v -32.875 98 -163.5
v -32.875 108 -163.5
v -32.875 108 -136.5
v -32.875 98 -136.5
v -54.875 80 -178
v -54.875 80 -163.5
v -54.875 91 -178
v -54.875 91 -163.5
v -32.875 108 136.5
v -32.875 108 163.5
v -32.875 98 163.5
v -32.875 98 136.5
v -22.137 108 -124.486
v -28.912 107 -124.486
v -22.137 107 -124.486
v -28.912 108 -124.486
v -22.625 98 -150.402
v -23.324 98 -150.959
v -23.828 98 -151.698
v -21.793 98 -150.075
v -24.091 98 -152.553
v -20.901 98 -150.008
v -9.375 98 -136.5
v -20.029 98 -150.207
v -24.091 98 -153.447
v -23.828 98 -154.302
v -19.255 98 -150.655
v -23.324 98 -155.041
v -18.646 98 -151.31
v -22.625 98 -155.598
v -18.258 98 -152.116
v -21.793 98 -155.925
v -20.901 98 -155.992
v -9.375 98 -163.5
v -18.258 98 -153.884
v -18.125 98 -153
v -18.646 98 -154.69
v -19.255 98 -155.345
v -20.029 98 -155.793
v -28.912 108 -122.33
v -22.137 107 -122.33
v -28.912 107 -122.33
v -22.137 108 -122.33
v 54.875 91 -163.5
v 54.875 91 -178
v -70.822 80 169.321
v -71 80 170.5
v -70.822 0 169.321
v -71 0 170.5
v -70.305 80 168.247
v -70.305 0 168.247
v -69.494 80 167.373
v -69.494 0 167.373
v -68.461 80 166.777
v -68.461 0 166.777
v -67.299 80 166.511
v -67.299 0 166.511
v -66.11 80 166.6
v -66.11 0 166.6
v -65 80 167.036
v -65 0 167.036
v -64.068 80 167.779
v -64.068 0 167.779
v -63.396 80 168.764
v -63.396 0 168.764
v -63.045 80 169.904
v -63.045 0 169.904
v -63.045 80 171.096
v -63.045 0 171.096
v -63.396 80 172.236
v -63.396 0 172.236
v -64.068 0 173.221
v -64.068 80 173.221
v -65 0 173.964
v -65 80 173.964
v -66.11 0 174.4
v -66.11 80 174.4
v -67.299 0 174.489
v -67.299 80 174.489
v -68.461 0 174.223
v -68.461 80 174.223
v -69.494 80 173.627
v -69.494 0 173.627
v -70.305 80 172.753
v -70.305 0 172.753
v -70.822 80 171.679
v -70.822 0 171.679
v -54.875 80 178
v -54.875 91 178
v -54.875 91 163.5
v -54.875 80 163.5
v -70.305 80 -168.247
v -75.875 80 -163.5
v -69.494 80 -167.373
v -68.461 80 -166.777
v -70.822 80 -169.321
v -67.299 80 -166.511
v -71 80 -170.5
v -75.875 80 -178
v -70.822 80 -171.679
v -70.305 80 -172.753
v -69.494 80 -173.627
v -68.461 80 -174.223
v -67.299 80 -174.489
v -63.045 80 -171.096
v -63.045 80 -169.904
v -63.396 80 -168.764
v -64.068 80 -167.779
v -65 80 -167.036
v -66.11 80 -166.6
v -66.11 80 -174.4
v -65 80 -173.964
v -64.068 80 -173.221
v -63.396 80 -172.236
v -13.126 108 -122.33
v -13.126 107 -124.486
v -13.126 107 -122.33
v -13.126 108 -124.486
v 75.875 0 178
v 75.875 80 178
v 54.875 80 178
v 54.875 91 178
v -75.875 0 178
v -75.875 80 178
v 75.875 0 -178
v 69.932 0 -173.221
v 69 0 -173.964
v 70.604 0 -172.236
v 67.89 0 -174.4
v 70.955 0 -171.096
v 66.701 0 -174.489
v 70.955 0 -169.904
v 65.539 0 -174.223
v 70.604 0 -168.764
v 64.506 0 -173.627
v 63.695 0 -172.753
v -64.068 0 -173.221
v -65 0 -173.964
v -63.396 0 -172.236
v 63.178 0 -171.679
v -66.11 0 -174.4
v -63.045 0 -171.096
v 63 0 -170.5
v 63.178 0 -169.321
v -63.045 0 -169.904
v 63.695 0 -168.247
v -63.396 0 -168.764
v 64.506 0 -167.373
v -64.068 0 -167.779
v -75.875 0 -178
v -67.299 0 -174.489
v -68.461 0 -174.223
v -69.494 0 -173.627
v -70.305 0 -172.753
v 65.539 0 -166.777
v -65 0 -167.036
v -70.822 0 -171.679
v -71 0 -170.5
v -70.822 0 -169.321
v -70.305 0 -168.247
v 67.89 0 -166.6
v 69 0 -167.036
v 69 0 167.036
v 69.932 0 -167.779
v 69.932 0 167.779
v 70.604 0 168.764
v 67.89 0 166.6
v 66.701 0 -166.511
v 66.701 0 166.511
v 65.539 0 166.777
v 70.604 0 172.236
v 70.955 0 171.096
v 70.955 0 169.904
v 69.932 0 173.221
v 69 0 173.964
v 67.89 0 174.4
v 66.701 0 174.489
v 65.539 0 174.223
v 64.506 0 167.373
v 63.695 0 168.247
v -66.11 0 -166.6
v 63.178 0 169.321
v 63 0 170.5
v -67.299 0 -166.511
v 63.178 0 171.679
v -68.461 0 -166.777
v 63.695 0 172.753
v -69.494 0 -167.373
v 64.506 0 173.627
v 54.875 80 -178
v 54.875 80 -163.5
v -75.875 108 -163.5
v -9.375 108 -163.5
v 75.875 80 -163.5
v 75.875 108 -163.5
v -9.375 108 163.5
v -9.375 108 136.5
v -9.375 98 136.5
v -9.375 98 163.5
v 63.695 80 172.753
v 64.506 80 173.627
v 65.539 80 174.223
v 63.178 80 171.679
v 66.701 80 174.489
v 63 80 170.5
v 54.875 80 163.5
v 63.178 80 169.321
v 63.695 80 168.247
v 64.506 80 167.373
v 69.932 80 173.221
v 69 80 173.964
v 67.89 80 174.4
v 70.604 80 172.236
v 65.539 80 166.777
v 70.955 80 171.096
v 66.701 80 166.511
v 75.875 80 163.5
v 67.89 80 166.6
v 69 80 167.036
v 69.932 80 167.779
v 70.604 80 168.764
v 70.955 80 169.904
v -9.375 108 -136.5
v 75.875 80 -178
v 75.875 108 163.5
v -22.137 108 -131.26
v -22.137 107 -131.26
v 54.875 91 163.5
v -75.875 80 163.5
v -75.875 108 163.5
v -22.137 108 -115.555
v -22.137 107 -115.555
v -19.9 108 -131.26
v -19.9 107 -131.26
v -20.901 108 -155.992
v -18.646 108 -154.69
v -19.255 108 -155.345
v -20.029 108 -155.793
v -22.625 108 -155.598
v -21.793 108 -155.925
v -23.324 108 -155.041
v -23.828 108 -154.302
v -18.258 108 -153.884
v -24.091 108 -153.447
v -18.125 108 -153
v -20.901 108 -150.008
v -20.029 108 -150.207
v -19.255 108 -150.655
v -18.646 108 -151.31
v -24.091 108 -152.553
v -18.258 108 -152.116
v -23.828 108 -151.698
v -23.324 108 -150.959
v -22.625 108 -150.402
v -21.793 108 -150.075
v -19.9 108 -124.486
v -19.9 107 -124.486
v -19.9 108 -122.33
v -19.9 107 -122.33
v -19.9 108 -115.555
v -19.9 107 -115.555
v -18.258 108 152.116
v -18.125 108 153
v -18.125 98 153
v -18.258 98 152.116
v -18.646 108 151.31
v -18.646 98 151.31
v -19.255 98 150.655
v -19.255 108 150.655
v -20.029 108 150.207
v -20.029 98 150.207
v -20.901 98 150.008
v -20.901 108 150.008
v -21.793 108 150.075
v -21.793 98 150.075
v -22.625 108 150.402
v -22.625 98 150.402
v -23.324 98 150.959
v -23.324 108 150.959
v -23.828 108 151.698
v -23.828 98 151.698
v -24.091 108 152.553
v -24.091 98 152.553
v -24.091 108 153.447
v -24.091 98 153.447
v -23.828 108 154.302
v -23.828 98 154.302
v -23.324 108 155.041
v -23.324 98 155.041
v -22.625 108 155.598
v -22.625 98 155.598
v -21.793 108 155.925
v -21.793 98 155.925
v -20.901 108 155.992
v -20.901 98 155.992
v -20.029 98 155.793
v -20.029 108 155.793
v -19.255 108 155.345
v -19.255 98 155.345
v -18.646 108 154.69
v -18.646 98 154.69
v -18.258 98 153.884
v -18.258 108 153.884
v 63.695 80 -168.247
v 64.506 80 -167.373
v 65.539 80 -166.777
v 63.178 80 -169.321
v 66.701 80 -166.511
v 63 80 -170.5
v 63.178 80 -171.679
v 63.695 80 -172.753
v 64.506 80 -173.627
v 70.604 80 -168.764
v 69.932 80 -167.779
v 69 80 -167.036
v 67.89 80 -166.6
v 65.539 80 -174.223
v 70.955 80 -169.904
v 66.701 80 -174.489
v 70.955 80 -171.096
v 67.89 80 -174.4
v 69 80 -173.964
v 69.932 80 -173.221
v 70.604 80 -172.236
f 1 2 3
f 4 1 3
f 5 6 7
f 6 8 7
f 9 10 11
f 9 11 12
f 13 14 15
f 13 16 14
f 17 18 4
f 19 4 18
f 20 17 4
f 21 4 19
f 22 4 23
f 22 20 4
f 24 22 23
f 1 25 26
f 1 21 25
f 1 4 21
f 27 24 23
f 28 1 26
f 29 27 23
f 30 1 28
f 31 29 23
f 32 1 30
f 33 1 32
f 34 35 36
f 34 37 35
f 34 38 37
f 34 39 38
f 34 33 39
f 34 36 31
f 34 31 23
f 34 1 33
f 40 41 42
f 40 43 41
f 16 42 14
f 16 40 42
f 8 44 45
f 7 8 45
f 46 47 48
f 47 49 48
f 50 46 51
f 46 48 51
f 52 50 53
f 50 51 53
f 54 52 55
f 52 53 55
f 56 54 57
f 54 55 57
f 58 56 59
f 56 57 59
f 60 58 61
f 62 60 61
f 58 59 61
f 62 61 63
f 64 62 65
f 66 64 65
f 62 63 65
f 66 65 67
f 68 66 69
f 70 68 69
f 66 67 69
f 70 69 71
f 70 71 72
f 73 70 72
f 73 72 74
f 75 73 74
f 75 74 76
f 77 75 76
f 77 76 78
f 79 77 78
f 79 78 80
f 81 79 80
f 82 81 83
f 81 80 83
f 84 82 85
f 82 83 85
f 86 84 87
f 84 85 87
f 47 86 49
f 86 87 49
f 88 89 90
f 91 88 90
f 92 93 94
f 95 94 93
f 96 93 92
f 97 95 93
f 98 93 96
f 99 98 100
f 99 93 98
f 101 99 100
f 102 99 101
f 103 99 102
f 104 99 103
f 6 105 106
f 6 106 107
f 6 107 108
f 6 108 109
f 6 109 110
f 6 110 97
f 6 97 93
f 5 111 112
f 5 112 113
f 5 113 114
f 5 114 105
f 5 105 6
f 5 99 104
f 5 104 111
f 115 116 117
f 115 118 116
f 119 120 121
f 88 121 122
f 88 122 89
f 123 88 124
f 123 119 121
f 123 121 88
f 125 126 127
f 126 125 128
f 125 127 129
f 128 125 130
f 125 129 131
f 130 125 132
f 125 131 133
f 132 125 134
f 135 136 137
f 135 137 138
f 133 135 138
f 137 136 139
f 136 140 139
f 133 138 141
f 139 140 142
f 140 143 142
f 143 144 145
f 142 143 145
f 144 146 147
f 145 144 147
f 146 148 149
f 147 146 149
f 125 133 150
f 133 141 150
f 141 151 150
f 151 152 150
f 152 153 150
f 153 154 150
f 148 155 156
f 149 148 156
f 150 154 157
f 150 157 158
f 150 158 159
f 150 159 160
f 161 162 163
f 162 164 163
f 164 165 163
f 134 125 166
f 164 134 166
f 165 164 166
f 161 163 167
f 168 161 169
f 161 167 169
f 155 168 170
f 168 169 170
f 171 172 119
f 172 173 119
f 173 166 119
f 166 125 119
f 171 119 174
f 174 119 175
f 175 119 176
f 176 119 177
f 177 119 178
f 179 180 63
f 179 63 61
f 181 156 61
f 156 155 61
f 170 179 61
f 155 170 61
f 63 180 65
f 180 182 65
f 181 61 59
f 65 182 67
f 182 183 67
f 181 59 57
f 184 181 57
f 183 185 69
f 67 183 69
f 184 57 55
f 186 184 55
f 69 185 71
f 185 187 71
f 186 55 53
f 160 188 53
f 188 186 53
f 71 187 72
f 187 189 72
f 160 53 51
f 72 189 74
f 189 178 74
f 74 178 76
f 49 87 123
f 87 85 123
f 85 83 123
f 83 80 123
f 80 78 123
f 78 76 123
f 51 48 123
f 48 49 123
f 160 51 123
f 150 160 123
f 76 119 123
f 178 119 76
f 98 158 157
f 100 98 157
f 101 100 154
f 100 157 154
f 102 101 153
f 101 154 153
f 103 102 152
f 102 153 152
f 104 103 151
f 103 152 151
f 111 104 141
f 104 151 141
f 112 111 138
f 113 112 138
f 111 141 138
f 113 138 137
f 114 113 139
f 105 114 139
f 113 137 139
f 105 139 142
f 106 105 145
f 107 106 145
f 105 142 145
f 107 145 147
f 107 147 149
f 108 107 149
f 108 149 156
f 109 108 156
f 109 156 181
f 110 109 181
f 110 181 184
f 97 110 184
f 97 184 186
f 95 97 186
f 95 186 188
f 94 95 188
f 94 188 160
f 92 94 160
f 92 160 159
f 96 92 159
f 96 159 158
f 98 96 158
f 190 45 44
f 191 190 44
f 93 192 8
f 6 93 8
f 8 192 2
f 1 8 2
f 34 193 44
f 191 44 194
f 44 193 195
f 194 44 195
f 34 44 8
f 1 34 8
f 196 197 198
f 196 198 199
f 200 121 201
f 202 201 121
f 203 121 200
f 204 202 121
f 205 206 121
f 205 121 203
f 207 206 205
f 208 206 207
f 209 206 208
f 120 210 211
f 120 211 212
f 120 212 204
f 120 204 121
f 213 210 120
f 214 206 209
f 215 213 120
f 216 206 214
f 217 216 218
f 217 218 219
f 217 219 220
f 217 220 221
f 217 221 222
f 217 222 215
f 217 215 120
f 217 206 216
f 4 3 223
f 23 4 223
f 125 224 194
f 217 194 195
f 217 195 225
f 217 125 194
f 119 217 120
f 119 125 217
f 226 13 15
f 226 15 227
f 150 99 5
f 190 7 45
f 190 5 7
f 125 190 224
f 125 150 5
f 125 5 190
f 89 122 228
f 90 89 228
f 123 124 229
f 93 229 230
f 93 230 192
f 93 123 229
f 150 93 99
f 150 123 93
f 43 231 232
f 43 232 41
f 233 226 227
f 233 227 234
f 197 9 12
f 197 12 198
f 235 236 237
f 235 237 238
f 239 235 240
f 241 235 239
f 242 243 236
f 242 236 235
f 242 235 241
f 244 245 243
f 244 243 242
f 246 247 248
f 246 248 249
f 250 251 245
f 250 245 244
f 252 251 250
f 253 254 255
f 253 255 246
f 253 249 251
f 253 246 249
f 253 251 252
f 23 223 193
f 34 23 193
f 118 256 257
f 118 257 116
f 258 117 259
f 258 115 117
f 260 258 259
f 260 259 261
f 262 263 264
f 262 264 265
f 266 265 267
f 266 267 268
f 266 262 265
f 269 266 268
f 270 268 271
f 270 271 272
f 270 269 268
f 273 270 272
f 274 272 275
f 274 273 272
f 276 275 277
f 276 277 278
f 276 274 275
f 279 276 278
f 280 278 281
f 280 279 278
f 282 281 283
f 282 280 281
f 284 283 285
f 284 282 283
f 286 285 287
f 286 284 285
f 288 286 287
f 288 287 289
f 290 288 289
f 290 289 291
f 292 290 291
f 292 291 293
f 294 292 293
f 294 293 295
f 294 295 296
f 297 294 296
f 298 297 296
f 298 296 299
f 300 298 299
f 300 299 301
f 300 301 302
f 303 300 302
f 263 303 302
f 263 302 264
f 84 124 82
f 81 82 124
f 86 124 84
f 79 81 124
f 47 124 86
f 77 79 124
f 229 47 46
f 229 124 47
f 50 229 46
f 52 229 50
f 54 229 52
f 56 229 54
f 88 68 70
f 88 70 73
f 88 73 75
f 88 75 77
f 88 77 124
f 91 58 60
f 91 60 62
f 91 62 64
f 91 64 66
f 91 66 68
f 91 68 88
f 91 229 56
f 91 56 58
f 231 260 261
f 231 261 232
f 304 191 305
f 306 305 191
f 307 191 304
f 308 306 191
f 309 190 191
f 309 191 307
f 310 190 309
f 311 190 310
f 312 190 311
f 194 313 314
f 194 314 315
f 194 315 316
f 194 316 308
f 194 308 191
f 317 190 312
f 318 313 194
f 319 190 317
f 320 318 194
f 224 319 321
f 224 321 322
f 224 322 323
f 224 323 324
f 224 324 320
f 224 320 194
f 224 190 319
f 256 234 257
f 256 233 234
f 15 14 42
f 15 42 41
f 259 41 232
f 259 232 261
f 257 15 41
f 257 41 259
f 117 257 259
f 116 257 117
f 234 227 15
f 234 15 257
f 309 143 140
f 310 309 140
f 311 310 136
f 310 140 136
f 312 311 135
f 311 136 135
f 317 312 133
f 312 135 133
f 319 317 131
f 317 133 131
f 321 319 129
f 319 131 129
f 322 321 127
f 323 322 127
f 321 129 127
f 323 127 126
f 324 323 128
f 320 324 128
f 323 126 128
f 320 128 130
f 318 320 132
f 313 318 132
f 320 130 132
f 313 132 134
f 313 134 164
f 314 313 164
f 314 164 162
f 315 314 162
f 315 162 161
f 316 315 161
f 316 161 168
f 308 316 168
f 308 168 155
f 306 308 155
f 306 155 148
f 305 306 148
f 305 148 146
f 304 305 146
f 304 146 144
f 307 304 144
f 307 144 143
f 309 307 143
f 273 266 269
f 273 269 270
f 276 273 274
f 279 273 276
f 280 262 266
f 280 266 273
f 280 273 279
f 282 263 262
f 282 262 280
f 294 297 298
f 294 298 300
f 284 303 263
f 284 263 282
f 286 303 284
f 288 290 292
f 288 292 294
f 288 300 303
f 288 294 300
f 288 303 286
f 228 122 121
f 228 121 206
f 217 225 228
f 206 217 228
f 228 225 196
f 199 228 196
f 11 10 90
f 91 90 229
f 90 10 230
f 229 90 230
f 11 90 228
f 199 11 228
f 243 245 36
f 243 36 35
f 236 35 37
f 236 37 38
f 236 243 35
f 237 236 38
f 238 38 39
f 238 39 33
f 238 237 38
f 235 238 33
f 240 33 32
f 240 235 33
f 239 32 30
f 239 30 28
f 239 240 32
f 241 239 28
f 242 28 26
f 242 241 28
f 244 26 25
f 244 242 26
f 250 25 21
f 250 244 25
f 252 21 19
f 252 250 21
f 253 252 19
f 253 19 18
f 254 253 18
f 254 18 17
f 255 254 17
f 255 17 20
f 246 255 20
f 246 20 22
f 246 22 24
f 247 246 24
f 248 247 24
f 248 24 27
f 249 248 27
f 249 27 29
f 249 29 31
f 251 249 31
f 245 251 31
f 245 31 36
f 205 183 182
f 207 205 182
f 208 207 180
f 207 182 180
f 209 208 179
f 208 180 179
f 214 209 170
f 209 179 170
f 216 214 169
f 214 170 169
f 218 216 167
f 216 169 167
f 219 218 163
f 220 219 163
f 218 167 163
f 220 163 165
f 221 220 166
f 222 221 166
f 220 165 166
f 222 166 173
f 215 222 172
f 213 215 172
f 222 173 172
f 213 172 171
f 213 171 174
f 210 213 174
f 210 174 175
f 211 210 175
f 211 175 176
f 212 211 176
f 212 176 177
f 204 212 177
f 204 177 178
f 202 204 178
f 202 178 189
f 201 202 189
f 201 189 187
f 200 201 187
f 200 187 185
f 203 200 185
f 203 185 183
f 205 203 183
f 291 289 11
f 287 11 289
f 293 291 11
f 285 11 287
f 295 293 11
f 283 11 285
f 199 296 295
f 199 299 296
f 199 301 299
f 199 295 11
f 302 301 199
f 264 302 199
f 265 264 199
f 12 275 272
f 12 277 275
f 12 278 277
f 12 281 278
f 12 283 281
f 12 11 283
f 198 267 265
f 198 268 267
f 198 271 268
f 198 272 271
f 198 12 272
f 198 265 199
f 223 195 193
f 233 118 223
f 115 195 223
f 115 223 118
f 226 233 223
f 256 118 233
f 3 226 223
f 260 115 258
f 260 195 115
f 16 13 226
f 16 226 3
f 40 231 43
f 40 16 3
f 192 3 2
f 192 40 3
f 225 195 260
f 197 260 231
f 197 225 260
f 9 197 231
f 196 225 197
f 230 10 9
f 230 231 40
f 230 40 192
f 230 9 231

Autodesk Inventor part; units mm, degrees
ref_plane "YZ Plane" through (0, 0, 0) normal (1, 0, 0) x (0, 1, 0)
ref_plane "XZ Plane" through (0, 0, 0) normal (0, 1, 0) x (-1, 0, 0)
sketch "Sketch1" plane through (0, 0, 0) normal (0, 1, 0) x (-1, 0, 0)
  line L0 (-75.875, 178) -> (75.875, 178)
  line L1 (75.875, 178) -> (75.875, -178)
  line L2 (75.875, -178) -> (-75.875, -178)
  line L3 (-75.875, -178) -> (-75.875, 178)
  line L4 (-75.875, 178) -> (75.875, -178) construction
  line L5 (75.875, 178) -> (-75.875, -178) construction
  circle A0 centre (67, 170.5) radius 4
  circle A1 centre (-67, 170.5) radius 4
  circle A2 centre (-67, -170.5) radius 4
  circle A3 centre (67, -170.5) radius 4
  line L6 (67, 170.5) -> (-67, 170.5) construction
  line L7 (75.875, 178) -> (67, 170.5) construction
  line L8 (-67, 170.5) -> (-75.875, 178) construction
  line L9 (67, -170.5) -> (67, 170.5) construction
  line L10 (67, -170.5) -> (-67, -170.5) construction
  line L11 (-67, -170.5) -> (-75.875, -178) construction
  line L12 (67, -170.5) -> (75.875, -178) construction
  point P0 (0, 0)
  dimension "d0" = 151.75
  dimension "d1" = 356
  dimension "d11" = 8
  dimension "d12" = 134
  dimension "d13" = 7.5
extrude "Extrusion1" add sketch "Sketch1" along normal blind 108
sketch "Sketch2" plane through (0, 108, 0) normal (0, 1, 0) x (1, 0, 0)
  line L0 (-75.875, -178) -> (75.875, -178) projected
  line L1 (75.875, 178) -> (-75.875, 178) projected
  line L2 (-32.875, 178) -> (-32.875, 136.5)
  line L3 (-32.875, 136.5) -> (-9.375, 136.5)
  line L4 (-9.375, 136.5) -> (-9.375, 178)
  line L5 (-32.875, -178) -> (-32.875, -136.5)
  line L6 (-32.875, -136.5) -> (-9.375, -136.5)
  line L7 (-9.375, -136.5) -> (-9.375, -178)
  circle A0 centre (-21.125, -153) radius 3
  circle A1 centre (-21.125, 153) radius 3
  line L8 (-32.875, 178) -> (-21.125, 153) construction
  line L9 (-21.125, 153) -> (-9.375, 178) construction
  line L10 (-32.875, -178) -> (-21.125, -153) construction
  line L11 (-21.125, -153) -> (-9.375, -178) construction
  point P0 (0, 0)
  dimension "d4" = 43
  dimension "d5" = 23.5
  dimension "d6" = 41.5
  dimension "d19" = 6
  dimension "d20" = 25
extrude "Extrusion2" cut sketch "Sketch2" against normal blind 10
sketch "Sketch3" plane through (0, 108, 0) normal (0, 1, 0) x (1, 0, 0)
  line L0 (-32.875, -178) -> (-32.875, -136.5) projected
  line L1 (-75.875, -178) -> (-32.875, -178) projected
  line L2 (-31.0347, 131.2602) -> (-10.3663, 131.2602) construction
  line L3 (-10.3663, 131.2602) -> (-10.3663, 113.395) construction
  line L4 (-10.3663, 113.395) -> (-31.0347, 113.395) construction
  line L5 (-31.0347, 113.395) -> (-31.0347, 131.2602) construction
  line L6 (-13.1255, 122.3299) -> (-19.9002, 122.3299)
  line L7 (-19.9002, 122.3299) -> (-19.9002, 115.5552)
  line L8 (-19.9002, 115.5552) -> (-22.1369, 115.5552)
  line L9 (-22.1369, 115.5552) -> (-22.1369, 122.3299)
  line L10 (-22.1369, 122.3299) -> (-28.9116, 122.3299)
  line L11 (-28.9116, 122.3299) -> (-28.9116, 124.4855)
  line L12 (-28.9116, 124.4855) -> (-22.1369, 124.4855)
  line L13 (-22.1369, 124.4855) -> (-22.1369, 131.2602)
  line L14 (-22.1369, 131.2602) -> (-19.9002, 131.2602)
  line L15 (-19.9002, 131.2602) -> (-19.9002, 124.4855)
  line L16 (-19.9002, 124.4855) -> (-13.1255, 124.4855)
  line L17 (-13.1255, 124.4855) -> (-13.1255, 122.3299)
  point P0 (0, 0)
  point P1 (-32.875, 178)
  point P2 (-75.875, 178)
  point P3 (-32.875, 136.5)
extrude "Extrusion3" cut sketch "Sketch3" against normal blind 1
ref_plane "Work Plane1" through (0, 80, 0) normal (0, -1, 0) x (1, 0, 0)
sketch "Sketch4" plane through (0, 108, 0) normal (0, 1, 0) x (1, 0, 0)
  line L0 (-75.875, -178) -> (-32.875, -178) projected
  line L1 (-75.875, 178) -> (-75.875, -178) projected
  line L2 (-9.375, -178) -> (75.875, -178) projected
  line L3 (75.875, -178) -> (75.875, 178) projected
  line L4 (75.875, 178) -> (-9.375, 178) projected
  line L5 (-32.875, 178) -> (-75.875, 178) projected
  line L6 (-75.875, 163.5) -> (-54.875, 163.5)
  line L7 (-54.875, 163.5) -> (-54.875, 178)
  line L8 (54.875, 178) -> (54.875, 163.5)
  line L9 (54.875, 163.5) -> (75.875, 163.5)
  line L10 (54.875, -178) -> (54.875, -163.5)
  line L11 (54.875, -163.5) -> (75.875, -163.5)
  line L12 (-54.875, -178) -> (-54.875, -163.5)
  line L13 (-54.875, -163.5) -> (-75.875, -163.5)
  point P0 (0, 0)
  dimension "d14" = 327
  dimension "d15" = 21
extrude "Extrusion4" cut sketch "Sketch4" against normal up to surface (28 mm away)
sketch "Sketch6" plane through (75.875, 0, 178) normal (1, 0, 0) x (0, 0, -1)
  line L0 (0, 80) -> (0, 108) projected
  line L1 (0, 108) -> (14.5, 108) projected
  line L2 (341.5, 108) -> (356, 108) projected
  line L3 (356, 108) -> (356, 80) projected
  line L4 (356, 0) -> (0, 0) construction
  line L5 (341.5, 108) -> (341.5, 80) projected
  line L6 (14.5, 108) -> (14.5, 80) projected
  line L7 (0, 91) -> (14.5, 91)
  line L8 (341.5, 91) -> (356, 91)
  point P0 (178, 0)
  dimension "d24" = 91
extrude "Extrusion6" cut sketch "Sketch6" against normal up to surface (151.75 mm away)
properties part number "47Ah-FoMoCo"
